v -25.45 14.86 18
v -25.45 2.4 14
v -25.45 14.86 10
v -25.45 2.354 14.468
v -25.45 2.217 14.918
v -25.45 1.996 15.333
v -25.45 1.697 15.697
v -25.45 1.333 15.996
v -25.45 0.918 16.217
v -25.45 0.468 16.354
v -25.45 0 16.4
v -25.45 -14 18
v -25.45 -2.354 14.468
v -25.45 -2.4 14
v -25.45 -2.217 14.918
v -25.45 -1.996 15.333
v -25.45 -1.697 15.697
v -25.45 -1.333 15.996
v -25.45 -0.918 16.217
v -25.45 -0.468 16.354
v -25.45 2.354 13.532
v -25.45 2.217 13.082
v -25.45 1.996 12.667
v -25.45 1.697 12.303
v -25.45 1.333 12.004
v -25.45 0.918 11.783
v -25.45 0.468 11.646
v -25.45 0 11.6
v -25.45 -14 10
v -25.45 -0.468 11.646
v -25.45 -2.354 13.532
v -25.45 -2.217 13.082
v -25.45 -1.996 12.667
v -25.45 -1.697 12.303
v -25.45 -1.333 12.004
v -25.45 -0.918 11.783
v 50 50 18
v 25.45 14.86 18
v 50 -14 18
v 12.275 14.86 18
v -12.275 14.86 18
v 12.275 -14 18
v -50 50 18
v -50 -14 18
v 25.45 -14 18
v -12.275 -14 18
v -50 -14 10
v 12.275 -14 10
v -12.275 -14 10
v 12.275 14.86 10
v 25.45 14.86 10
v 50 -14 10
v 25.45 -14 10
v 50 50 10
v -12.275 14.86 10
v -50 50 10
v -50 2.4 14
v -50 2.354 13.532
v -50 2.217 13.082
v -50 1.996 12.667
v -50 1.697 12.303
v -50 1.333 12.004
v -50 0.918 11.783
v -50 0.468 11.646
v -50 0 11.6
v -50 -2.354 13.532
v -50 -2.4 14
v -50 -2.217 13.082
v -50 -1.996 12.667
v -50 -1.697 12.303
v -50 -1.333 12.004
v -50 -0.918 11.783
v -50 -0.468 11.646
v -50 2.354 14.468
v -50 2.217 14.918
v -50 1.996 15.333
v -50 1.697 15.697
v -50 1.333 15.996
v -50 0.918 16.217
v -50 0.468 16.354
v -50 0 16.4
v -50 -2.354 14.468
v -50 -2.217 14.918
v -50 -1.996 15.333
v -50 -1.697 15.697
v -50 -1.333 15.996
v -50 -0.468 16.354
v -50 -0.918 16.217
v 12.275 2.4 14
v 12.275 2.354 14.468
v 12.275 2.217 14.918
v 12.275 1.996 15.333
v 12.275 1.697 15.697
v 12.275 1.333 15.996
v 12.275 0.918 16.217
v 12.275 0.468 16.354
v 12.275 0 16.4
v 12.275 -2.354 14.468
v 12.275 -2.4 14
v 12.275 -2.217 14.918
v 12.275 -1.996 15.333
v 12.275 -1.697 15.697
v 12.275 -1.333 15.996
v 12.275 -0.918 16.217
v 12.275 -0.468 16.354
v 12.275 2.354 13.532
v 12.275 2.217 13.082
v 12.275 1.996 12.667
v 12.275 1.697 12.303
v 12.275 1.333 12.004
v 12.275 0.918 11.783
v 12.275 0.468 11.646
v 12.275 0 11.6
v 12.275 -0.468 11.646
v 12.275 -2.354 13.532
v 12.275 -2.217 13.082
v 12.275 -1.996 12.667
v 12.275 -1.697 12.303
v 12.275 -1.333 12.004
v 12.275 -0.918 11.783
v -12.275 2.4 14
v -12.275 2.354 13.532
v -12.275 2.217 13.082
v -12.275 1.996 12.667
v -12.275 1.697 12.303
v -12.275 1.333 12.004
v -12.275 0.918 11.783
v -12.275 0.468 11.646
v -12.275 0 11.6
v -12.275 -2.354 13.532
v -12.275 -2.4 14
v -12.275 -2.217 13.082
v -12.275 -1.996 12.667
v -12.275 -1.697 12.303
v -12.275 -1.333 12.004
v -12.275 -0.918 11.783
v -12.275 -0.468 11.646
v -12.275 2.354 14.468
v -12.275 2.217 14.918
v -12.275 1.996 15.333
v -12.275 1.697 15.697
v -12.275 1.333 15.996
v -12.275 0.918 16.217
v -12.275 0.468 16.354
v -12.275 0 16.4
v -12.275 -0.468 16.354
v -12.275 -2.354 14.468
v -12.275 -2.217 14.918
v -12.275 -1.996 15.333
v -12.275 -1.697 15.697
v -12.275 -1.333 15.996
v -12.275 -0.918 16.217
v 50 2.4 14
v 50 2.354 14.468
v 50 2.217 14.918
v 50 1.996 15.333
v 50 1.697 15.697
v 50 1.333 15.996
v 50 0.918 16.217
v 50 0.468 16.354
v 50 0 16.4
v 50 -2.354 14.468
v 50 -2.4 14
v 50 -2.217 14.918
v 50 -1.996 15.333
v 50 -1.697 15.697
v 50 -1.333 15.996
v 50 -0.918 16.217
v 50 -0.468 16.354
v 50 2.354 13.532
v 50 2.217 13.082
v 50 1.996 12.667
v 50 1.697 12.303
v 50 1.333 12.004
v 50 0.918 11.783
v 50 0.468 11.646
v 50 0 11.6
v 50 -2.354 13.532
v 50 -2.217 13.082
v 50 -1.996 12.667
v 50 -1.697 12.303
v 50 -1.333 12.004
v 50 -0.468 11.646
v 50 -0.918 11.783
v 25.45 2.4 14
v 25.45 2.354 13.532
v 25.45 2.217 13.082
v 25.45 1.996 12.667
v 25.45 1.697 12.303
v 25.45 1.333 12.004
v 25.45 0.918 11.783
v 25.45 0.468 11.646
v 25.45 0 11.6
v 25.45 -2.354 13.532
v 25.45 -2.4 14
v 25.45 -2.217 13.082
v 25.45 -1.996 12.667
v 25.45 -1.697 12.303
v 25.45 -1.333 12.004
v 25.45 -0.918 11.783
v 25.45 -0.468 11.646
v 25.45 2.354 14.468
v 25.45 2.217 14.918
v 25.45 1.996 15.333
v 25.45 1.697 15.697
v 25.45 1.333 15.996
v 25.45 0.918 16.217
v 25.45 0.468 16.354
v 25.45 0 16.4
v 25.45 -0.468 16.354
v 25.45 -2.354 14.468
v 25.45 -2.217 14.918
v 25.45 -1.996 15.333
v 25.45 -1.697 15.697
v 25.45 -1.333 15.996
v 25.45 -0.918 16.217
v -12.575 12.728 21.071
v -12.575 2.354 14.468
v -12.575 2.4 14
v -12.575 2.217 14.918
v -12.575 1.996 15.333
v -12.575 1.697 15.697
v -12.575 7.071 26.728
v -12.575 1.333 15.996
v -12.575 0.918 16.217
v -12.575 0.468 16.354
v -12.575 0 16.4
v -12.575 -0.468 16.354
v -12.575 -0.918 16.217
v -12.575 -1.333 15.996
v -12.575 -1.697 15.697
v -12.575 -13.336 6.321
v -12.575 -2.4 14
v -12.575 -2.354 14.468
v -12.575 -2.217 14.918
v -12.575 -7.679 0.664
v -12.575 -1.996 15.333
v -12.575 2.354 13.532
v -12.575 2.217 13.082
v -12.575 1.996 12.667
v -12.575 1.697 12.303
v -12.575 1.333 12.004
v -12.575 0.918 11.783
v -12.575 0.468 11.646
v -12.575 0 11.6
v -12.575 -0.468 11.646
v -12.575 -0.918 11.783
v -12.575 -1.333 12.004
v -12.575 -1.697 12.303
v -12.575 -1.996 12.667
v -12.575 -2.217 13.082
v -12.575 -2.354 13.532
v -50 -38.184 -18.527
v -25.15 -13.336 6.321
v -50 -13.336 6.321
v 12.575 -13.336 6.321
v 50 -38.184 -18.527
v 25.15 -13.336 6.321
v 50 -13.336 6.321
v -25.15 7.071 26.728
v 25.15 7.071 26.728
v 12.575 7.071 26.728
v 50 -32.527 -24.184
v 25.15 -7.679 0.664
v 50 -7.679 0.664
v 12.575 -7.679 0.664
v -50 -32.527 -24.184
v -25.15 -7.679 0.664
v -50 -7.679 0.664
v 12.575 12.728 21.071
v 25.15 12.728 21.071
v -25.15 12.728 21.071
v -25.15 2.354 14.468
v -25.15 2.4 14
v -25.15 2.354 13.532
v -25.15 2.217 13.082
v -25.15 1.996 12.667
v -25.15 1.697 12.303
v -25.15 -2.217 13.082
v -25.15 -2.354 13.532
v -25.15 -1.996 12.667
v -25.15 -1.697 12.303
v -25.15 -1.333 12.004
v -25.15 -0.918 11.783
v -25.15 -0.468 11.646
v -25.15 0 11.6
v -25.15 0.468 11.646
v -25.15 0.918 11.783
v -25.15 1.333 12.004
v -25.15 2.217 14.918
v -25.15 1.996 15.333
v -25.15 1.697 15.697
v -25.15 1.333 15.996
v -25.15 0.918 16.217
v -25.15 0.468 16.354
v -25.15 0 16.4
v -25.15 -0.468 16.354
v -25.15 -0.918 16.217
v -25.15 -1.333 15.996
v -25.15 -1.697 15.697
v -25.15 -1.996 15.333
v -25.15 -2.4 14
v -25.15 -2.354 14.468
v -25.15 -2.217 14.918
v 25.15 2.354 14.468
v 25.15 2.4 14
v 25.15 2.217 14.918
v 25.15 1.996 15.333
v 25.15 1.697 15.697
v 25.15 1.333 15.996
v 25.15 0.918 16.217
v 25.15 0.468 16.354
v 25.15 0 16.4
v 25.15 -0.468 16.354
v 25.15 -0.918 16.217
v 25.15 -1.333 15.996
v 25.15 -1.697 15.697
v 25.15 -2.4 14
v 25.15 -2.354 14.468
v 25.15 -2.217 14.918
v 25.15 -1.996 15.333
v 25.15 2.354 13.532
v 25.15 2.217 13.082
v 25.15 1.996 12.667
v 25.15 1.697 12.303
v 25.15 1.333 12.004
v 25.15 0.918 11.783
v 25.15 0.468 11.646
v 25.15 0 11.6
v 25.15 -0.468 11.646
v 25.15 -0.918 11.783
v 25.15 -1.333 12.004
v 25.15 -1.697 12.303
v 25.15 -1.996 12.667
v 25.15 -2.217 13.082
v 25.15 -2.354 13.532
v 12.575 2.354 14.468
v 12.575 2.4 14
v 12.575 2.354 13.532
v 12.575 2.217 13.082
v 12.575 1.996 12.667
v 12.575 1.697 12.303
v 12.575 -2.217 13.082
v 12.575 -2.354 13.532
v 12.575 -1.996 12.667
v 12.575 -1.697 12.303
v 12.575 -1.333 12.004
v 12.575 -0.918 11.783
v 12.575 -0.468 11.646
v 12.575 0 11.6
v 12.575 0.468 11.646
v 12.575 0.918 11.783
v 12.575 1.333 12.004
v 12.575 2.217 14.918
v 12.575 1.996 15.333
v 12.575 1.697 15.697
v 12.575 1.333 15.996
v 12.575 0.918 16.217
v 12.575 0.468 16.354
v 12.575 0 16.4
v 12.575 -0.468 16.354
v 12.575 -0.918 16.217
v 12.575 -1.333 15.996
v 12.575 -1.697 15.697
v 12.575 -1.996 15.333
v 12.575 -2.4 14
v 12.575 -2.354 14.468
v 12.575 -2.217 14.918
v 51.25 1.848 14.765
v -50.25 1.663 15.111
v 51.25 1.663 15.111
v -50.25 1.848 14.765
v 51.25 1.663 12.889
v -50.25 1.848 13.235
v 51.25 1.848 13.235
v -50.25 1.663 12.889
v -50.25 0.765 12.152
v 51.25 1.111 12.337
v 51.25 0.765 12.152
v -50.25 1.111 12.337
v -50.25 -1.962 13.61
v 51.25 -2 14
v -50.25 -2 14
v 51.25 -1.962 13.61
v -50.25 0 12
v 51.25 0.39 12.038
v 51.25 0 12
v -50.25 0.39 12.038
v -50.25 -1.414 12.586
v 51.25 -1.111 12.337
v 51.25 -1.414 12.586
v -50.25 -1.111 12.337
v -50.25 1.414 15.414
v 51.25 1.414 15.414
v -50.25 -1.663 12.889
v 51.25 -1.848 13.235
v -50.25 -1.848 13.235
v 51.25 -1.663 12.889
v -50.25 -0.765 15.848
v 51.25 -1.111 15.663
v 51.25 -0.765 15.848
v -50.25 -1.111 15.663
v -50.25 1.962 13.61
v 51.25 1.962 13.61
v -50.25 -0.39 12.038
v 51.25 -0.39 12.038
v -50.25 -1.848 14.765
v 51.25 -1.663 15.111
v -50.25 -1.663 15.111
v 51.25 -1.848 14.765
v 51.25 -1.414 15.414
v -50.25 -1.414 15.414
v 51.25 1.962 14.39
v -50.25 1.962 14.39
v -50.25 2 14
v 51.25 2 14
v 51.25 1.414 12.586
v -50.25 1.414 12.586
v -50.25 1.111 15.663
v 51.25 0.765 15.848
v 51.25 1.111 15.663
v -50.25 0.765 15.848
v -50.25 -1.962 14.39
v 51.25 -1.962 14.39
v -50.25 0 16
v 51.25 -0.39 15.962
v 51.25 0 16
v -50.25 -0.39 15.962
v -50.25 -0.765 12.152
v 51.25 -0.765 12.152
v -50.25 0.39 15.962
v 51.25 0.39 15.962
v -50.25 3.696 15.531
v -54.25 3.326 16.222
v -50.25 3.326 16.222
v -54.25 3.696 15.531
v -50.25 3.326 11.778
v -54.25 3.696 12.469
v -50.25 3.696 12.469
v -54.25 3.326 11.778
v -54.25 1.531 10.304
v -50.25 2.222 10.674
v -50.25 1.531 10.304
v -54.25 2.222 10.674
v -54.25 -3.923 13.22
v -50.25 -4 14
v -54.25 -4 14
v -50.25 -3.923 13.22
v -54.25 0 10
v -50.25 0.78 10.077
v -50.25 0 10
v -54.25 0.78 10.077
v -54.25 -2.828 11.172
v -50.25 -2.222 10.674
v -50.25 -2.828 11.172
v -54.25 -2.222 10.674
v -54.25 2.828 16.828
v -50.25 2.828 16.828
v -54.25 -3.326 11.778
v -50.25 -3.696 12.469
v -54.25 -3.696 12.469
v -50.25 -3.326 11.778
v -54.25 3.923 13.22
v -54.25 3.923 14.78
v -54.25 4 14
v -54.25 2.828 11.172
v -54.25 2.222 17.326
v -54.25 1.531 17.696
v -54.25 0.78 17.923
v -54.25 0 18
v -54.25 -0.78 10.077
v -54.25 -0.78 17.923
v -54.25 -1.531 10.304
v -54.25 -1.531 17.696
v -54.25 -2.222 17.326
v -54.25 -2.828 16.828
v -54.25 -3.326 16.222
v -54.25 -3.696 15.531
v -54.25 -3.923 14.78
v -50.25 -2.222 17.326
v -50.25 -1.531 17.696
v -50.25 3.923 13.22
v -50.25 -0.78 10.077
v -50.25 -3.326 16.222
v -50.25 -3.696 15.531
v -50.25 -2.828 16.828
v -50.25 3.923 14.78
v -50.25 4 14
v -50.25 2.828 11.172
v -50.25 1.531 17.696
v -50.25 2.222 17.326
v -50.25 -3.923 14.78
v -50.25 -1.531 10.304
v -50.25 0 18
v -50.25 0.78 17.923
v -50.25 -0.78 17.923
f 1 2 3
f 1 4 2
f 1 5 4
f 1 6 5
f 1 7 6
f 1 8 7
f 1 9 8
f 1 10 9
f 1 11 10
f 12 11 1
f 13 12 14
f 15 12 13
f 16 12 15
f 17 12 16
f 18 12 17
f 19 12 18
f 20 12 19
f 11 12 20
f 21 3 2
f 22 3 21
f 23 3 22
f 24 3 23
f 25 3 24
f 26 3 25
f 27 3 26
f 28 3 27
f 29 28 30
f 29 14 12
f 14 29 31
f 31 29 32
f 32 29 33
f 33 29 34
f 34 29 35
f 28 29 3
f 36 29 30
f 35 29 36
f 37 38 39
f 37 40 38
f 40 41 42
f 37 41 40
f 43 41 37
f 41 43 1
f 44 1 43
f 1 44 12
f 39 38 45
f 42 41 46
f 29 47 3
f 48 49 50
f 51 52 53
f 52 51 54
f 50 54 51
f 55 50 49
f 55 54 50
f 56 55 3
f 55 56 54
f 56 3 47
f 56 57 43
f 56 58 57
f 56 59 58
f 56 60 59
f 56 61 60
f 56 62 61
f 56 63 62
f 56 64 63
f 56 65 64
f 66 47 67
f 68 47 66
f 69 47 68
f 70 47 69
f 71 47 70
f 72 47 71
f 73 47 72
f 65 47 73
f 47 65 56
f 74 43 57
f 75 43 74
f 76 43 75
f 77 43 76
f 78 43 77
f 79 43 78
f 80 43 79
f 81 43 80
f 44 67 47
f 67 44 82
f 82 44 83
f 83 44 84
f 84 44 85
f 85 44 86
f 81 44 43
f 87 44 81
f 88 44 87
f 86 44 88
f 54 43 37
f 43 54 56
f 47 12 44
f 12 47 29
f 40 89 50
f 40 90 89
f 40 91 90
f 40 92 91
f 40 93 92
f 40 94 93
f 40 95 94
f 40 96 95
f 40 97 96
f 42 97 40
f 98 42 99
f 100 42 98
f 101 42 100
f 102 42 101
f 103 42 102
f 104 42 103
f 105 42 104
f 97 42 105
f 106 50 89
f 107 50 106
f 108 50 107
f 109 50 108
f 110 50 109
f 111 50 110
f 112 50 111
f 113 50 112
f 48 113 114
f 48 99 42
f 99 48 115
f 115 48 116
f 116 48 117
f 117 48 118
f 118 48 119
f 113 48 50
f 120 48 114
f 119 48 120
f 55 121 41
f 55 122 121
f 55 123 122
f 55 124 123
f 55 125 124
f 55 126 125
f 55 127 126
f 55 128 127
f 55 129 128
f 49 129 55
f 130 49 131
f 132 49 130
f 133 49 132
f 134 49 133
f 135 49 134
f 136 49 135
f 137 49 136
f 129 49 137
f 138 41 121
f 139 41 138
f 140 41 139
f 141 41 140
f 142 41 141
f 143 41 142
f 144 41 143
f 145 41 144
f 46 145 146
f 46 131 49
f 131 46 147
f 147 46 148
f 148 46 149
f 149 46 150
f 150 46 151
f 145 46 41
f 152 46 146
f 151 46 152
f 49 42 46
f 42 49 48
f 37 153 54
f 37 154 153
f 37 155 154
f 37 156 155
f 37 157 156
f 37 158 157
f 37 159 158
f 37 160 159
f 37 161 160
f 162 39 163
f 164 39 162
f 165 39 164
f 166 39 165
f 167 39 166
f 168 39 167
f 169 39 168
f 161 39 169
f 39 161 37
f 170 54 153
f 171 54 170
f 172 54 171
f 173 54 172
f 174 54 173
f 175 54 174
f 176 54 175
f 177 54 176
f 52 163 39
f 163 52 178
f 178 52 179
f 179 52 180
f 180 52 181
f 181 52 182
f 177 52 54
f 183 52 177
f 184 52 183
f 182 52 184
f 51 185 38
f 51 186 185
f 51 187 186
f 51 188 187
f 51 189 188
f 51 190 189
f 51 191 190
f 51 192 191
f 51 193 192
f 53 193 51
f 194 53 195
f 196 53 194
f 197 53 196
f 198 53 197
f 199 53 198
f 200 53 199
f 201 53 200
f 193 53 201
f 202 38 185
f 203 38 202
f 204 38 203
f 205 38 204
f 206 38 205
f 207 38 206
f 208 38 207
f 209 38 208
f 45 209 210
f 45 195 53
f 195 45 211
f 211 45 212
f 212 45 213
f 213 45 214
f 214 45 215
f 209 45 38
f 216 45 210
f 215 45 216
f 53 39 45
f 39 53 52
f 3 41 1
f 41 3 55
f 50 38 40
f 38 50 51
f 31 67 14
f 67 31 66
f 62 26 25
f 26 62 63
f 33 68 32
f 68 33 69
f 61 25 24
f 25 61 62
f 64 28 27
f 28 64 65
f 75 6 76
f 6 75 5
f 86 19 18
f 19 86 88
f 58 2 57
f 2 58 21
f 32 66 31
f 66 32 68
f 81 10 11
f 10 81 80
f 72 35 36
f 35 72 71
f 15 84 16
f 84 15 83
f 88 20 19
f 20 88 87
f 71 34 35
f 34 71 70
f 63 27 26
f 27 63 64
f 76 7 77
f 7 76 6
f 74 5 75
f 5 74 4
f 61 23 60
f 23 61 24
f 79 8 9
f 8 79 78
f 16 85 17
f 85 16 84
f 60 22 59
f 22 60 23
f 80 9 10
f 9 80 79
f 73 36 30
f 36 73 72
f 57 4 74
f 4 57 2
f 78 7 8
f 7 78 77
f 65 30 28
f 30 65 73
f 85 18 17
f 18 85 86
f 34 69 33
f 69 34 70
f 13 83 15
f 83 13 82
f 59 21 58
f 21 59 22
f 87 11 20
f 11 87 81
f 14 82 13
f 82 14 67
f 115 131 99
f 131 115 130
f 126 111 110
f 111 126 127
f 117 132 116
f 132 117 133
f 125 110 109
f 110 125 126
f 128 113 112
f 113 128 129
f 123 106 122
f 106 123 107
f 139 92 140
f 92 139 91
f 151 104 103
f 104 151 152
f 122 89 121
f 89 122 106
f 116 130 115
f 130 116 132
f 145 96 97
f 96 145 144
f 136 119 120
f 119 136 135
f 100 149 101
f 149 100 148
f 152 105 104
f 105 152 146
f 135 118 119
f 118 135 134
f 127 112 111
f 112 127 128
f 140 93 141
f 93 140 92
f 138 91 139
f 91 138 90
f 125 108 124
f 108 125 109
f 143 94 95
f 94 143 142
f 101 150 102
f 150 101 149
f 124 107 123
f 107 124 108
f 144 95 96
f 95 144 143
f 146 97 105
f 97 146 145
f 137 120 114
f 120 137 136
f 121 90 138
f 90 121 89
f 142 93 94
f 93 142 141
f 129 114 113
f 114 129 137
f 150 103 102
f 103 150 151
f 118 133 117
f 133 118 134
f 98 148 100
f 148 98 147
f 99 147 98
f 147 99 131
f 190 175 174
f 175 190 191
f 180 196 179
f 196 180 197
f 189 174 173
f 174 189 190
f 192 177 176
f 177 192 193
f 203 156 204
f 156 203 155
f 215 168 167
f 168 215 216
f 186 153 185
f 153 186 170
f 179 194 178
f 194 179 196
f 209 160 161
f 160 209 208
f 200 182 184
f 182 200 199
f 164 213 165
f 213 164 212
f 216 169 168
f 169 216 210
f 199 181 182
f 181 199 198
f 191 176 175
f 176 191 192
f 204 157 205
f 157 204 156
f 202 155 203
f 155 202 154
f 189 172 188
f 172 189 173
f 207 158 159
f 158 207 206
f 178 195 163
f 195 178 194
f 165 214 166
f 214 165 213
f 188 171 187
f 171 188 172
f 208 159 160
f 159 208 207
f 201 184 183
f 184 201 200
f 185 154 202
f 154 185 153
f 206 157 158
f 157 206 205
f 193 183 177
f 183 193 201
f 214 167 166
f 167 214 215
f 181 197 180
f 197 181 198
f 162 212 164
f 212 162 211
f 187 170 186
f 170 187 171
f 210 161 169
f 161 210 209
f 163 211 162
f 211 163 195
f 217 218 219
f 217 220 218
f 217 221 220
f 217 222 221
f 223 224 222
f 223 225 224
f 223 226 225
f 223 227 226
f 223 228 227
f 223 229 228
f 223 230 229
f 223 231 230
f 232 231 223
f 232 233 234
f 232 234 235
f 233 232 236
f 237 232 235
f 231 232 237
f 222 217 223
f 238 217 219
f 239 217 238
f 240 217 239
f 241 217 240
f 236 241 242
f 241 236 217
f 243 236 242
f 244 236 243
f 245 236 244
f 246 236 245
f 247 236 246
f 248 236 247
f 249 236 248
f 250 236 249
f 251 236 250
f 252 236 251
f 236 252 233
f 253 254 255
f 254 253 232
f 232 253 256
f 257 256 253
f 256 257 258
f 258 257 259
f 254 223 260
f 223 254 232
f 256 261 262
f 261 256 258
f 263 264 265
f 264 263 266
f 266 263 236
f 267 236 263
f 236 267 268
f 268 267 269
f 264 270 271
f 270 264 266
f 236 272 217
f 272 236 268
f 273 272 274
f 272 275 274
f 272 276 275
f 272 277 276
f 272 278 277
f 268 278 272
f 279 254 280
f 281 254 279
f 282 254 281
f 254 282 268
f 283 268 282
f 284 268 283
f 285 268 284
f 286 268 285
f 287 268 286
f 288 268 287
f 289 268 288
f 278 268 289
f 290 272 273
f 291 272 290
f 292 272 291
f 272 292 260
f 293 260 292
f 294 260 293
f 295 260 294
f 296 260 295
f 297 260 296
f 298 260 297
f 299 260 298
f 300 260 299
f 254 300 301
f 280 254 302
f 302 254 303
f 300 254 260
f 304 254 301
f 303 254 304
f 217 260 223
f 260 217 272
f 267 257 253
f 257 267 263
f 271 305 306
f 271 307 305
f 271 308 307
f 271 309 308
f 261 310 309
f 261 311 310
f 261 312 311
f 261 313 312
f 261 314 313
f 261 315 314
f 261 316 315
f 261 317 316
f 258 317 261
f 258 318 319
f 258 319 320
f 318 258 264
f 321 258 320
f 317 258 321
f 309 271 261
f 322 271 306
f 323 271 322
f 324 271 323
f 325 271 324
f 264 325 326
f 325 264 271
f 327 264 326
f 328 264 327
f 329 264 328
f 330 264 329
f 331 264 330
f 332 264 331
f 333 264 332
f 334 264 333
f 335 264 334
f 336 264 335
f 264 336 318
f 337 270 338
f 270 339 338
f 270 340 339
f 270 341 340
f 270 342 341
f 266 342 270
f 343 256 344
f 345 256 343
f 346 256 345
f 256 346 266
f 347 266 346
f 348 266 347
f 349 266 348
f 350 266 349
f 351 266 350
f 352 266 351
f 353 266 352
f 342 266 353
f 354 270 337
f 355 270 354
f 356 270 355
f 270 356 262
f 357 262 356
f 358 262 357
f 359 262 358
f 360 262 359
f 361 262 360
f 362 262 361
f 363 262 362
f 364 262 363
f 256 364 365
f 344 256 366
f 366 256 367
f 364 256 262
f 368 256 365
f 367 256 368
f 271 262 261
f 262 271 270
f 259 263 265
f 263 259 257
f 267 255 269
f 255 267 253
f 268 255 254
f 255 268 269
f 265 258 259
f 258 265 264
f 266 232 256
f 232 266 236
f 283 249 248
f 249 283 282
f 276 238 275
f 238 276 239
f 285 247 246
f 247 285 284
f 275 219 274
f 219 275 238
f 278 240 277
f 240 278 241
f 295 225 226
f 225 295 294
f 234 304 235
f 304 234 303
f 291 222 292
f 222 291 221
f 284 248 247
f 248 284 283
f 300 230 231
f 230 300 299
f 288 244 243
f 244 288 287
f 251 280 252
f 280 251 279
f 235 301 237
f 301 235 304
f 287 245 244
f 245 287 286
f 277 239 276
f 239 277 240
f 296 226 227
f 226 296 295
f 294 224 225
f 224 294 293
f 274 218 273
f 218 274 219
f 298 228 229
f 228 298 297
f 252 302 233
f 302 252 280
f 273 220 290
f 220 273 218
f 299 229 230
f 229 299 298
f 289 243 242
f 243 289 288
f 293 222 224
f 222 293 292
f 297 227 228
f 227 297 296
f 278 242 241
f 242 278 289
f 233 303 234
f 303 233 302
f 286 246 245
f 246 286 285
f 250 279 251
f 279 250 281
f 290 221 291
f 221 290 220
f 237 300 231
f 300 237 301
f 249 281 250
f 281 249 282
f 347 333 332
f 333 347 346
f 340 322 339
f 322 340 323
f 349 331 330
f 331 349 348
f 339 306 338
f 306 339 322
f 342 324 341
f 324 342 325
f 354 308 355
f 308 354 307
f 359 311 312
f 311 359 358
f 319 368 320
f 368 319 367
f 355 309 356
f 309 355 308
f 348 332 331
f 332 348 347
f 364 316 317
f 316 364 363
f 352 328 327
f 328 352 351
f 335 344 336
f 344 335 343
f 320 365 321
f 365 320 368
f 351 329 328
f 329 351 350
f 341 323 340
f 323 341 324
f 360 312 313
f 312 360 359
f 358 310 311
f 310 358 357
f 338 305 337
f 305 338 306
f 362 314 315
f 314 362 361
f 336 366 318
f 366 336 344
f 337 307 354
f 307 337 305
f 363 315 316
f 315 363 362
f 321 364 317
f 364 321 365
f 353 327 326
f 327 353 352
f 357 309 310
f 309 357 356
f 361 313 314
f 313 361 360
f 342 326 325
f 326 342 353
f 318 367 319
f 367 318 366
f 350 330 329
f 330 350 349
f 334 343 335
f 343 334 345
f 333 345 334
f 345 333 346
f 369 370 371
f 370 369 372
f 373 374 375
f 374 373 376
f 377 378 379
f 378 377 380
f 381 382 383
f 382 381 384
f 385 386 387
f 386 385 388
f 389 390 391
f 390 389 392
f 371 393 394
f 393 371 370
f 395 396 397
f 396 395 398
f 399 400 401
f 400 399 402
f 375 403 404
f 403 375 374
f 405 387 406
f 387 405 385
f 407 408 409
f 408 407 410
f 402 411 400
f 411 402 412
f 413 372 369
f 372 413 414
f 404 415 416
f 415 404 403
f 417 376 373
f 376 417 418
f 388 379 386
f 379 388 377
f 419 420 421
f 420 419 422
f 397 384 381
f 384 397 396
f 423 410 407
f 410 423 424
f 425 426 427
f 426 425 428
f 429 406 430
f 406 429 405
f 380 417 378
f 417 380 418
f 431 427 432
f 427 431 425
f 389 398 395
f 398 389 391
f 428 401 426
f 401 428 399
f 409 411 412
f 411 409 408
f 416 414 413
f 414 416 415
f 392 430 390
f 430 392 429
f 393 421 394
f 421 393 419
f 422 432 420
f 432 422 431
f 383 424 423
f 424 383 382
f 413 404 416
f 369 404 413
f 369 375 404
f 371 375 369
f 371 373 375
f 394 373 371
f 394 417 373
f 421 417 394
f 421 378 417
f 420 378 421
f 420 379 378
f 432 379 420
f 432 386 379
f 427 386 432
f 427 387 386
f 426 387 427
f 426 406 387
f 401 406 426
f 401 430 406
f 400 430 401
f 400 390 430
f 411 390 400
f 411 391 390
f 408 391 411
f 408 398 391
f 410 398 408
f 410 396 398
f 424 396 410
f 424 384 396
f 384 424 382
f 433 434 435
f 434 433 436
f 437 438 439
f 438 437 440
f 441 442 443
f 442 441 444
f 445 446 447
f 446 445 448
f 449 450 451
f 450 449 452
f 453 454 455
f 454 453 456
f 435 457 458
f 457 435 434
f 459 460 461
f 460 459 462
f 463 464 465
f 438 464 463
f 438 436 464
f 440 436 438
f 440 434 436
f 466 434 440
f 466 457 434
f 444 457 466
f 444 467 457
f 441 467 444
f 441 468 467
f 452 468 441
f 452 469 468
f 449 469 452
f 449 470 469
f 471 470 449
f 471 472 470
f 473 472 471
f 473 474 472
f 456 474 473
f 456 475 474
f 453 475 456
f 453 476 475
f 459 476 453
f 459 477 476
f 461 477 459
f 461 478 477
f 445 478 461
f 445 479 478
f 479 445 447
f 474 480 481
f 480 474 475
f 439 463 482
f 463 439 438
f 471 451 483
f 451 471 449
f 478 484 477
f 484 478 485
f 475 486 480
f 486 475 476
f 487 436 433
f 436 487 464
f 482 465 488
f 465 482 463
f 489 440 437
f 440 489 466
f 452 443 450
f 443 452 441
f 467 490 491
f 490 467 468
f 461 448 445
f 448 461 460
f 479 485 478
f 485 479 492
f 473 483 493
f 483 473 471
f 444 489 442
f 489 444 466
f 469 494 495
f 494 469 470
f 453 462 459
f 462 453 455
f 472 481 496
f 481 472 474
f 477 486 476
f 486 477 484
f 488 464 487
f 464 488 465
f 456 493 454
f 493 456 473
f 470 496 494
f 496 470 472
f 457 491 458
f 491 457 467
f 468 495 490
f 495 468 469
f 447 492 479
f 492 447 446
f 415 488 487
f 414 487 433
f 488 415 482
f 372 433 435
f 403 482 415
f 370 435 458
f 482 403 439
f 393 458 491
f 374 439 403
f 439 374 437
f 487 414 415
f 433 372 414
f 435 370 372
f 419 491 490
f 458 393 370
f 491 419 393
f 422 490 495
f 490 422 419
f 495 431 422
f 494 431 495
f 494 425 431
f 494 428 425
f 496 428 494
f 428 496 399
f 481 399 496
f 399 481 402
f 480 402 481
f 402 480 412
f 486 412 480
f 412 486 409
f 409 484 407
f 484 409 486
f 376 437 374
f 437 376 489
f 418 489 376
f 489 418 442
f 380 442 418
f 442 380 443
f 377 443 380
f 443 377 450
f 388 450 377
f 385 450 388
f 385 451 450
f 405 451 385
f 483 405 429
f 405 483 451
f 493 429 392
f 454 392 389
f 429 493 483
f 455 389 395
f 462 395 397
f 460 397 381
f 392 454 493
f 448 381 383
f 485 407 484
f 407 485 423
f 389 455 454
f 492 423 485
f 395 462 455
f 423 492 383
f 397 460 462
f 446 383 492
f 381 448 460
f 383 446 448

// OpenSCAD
$fn = 32;

// ------------------------------------------------------------------------
// Butt hinge: hinge 100 mm, leaf swung 45 deg
// Every part is its own module, assembly() places every instance.
// ------------------------------------------------------------------------

// --- part 1 ---
module hinge_base() {
  difference() {
    union() {
      translate([-50, -14, -4]) cube([24.55, 64, 8]);
      translate([-12.275, -14, -4]) cube([24.55, 64, 8]);
      translate([25.45, -14, -4]) cube([24.55, 64, 8]);
      translate([-50, 14.86, -4]) cube([100, 35.14, 8]);
    }
    translate([-37.725, 0, 0]) rotate([0, 90, 0]) cylinder(h = 26.55, d = 4.8, center = true);
    translate([0, 0, 0]) rotate([0, 90, 0]) cylinder(h = 26.55, d = 4.8, center = true);
    translate([37.725, 0, 0]) rotate([0, 90, 0]) cylinder(h = 26.55, d = 4.8, center = true);
  }
}

// --- part 2 ---
module hinge_mover() {
  difference() {
    union() {
      translate([-25.15, -50, -4]) cube([12.575, 64, 8]);
      translate([12.575, -50, -4]) cube([12.575, 64, 8]);
      translate([-50, -50, -4]) cube([100, 35.14, 8]);
    }
    translate([-18.863, 0, 0]) rotate([0, 90, 0]) cylinder(h = 14.575, d = 4.8, center = true);
    translate([18.863, 0, 0]) rotate([0, 90, 0]) cylinder(h = 14.575, d = 4.8, center = true);
  }
}

// --- part 3 ---
module hinge_pin() {
  rotate([0, 90, 0]) cylinder(h = 102.5, d = 4, center = true);
  translate([-54.25, 0, 0]) rotate([0, 90, 0]) cylinder(h = 4, d = 8);
}

// --- assembly ---
module assembly() {
  color([0.80, 0.24, 0.20]) translate([0, 0, 14]) rotate([0, 0, 0]) hinge_base();
  color([0.20, 0.45, 0.75]) translate([0, 0, 14]) rotate([45, 0, 0]) hinge_mover();
  color([0.25, 0.62, 0.32]) translate([0, 0, 14]) rotate([0, 0, 0]) hinge_pin();
}

assembly();
